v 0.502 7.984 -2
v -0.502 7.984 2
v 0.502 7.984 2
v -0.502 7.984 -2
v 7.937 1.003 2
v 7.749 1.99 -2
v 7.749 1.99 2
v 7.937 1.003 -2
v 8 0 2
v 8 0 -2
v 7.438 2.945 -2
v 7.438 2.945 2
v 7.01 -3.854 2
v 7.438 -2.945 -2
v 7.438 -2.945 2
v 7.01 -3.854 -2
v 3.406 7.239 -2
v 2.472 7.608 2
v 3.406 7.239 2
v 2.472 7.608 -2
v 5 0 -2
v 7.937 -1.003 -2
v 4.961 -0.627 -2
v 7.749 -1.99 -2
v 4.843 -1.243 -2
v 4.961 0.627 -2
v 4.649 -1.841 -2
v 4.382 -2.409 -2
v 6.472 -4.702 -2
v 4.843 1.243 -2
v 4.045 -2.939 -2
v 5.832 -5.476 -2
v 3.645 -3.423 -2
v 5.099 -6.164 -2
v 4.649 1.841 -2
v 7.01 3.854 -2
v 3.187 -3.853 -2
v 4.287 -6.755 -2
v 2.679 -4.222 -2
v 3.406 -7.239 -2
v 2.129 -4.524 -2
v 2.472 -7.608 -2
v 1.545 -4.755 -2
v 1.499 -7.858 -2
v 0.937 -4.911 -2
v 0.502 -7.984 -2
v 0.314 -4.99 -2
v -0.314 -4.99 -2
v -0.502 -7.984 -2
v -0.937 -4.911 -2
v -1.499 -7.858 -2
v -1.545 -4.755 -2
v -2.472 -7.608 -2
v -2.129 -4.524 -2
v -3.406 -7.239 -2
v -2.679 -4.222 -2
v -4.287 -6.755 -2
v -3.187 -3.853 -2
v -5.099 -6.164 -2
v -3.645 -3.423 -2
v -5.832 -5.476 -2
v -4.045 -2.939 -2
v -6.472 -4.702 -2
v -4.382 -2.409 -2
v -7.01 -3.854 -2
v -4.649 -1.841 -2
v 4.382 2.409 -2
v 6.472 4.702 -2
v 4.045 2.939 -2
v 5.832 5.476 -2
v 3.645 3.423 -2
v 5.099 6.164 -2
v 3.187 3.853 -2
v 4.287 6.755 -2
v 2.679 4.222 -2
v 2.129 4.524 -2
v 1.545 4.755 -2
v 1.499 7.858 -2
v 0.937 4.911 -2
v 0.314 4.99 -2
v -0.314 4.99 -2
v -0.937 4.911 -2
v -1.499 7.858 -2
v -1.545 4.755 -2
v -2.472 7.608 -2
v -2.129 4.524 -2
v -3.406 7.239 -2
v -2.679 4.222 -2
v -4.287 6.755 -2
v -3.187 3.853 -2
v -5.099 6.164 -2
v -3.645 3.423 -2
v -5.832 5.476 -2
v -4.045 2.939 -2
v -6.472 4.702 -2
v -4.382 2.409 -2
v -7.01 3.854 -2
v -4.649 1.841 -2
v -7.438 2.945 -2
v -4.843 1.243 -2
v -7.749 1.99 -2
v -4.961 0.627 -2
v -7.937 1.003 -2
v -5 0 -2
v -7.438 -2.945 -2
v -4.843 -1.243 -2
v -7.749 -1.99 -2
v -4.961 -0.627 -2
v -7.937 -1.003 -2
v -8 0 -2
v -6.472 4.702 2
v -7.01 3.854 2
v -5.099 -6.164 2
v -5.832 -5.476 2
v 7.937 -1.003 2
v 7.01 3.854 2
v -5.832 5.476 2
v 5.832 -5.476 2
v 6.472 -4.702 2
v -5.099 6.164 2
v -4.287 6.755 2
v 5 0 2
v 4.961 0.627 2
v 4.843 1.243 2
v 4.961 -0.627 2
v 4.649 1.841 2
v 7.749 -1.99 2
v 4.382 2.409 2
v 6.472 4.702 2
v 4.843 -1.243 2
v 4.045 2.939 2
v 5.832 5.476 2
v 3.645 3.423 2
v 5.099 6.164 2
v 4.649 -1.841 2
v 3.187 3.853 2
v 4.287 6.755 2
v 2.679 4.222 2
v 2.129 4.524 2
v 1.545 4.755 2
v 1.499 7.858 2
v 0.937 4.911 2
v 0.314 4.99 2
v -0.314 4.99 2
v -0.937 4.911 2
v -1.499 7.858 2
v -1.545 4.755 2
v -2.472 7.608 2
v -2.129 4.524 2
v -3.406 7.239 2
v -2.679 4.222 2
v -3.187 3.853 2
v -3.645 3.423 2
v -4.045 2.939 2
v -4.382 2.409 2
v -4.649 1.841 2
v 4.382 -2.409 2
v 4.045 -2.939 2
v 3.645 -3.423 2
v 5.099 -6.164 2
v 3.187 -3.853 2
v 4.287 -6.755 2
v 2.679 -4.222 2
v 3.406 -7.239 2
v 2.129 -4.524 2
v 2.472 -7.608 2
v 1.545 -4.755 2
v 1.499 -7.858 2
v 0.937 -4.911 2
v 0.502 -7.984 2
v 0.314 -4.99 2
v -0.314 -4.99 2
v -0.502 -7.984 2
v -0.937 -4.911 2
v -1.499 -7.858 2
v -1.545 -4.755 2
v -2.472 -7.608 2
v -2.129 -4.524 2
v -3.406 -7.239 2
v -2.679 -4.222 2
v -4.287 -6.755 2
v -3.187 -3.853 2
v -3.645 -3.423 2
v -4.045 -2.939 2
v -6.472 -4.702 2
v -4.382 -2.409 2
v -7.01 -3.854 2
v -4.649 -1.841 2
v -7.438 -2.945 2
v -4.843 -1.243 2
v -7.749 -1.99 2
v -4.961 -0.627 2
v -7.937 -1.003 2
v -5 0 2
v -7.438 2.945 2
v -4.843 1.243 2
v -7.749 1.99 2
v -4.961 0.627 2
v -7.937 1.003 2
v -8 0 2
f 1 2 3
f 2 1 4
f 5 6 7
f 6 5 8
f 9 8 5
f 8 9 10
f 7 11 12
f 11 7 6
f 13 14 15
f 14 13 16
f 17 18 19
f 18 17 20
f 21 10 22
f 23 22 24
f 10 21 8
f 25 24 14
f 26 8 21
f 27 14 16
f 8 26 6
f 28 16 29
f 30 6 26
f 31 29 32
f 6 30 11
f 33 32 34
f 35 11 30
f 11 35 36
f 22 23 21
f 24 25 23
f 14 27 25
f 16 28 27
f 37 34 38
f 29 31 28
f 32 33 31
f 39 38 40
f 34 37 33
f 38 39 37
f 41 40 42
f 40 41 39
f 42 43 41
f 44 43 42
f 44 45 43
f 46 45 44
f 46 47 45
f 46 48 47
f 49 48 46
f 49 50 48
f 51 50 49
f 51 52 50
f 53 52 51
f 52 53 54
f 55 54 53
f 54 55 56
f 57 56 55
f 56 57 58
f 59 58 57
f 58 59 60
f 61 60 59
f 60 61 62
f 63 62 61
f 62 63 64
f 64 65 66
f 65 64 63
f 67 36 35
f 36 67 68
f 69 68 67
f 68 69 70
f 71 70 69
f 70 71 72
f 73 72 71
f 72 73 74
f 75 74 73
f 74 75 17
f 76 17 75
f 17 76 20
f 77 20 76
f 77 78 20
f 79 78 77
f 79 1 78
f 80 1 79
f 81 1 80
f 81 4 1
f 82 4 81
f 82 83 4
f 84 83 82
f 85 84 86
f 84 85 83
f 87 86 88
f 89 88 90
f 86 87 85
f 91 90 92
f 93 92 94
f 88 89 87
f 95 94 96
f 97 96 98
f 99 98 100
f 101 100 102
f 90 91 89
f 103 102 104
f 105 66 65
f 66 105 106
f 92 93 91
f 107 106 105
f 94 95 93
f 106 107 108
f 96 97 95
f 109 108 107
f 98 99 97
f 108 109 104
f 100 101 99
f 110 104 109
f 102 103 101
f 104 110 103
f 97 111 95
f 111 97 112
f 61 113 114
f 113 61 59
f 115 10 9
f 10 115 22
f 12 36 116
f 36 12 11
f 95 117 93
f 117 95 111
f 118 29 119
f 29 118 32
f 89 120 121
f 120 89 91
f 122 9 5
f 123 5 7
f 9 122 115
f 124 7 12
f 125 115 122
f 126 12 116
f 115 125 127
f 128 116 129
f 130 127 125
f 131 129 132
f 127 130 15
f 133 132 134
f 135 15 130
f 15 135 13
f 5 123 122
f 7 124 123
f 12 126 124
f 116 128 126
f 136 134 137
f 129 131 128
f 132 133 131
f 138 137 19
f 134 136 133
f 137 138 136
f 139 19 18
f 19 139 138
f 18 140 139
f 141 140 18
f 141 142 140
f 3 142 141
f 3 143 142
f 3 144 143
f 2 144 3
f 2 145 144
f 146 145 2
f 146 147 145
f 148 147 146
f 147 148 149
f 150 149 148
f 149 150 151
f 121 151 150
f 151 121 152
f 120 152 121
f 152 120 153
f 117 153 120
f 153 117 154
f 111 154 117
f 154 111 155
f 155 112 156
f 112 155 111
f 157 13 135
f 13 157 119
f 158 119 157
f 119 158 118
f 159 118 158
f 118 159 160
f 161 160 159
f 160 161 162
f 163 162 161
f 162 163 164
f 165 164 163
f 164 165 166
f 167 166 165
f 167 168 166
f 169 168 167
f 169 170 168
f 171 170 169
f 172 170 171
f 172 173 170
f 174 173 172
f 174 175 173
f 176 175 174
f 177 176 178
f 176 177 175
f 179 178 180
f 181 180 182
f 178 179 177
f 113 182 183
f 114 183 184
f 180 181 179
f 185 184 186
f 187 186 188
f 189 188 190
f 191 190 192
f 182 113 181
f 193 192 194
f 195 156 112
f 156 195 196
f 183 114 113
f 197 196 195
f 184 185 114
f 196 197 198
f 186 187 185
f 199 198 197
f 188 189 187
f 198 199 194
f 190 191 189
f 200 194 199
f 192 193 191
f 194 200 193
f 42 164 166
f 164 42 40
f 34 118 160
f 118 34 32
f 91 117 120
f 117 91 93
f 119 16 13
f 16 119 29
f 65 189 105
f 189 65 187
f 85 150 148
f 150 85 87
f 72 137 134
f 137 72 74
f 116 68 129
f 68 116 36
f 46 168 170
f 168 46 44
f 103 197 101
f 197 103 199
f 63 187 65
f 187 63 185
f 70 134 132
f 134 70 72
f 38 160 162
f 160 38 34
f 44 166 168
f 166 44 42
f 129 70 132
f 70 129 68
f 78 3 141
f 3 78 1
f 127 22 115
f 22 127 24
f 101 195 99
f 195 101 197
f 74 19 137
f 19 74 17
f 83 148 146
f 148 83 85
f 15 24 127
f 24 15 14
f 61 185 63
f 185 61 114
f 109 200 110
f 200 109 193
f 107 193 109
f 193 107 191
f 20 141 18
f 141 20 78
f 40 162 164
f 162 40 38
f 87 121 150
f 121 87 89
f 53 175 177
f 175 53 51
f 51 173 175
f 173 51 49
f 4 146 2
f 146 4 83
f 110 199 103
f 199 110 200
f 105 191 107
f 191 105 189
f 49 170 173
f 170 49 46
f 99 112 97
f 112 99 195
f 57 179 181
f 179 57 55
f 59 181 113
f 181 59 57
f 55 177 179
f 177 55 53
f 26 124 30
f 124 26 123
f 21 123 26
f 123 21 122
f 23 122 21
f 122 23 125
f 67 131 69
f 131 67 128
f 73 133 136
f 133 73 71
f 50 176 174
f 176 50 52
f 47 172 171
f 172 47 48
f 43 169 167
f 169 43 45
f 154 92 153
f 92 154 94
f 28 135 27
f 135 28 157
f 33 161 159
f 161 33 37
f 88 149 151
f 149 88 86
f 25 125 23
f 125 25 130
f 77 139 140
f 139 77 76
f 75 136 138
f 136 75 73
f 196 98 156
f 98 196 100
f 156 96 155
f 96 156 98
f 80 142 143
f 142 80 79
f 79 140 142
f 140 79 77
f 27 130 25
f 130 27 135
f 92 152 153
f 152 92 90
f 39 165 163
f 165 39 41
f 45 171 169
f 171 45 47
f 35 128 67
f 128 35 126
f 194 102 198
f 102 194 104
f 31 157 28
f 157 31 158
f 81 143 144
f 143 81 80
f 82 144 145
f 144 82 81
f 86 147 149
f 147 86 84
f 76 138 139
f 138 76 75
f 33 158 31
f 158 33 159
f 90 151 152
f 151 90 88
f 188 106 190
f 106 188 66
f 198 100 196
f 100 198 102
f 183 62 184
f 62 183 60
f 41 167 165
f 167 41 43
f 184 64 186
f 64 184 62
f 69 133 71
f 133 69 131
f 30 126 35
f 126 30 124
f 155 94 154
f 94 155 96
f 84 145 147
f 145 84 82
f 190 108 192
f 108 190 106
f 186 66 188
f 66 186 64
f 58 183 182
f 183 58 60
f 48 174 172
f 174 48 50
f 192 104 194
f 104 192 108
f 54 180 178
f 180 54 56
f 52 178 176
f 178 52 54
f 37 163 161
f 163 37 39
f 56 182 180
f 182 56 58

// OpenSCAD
$fn = 50;


difference() {
	union() {
		translate(v = [0, 0, -2.0000000000]) {
			cylinder(h = 4, r = 8.0000000000);
		}
	}
	union() {
		translate(v = [0, 0, -100.0000000000]) {
			cylinder(h = 200, r = 5.0000000000);
		}
	}
}
